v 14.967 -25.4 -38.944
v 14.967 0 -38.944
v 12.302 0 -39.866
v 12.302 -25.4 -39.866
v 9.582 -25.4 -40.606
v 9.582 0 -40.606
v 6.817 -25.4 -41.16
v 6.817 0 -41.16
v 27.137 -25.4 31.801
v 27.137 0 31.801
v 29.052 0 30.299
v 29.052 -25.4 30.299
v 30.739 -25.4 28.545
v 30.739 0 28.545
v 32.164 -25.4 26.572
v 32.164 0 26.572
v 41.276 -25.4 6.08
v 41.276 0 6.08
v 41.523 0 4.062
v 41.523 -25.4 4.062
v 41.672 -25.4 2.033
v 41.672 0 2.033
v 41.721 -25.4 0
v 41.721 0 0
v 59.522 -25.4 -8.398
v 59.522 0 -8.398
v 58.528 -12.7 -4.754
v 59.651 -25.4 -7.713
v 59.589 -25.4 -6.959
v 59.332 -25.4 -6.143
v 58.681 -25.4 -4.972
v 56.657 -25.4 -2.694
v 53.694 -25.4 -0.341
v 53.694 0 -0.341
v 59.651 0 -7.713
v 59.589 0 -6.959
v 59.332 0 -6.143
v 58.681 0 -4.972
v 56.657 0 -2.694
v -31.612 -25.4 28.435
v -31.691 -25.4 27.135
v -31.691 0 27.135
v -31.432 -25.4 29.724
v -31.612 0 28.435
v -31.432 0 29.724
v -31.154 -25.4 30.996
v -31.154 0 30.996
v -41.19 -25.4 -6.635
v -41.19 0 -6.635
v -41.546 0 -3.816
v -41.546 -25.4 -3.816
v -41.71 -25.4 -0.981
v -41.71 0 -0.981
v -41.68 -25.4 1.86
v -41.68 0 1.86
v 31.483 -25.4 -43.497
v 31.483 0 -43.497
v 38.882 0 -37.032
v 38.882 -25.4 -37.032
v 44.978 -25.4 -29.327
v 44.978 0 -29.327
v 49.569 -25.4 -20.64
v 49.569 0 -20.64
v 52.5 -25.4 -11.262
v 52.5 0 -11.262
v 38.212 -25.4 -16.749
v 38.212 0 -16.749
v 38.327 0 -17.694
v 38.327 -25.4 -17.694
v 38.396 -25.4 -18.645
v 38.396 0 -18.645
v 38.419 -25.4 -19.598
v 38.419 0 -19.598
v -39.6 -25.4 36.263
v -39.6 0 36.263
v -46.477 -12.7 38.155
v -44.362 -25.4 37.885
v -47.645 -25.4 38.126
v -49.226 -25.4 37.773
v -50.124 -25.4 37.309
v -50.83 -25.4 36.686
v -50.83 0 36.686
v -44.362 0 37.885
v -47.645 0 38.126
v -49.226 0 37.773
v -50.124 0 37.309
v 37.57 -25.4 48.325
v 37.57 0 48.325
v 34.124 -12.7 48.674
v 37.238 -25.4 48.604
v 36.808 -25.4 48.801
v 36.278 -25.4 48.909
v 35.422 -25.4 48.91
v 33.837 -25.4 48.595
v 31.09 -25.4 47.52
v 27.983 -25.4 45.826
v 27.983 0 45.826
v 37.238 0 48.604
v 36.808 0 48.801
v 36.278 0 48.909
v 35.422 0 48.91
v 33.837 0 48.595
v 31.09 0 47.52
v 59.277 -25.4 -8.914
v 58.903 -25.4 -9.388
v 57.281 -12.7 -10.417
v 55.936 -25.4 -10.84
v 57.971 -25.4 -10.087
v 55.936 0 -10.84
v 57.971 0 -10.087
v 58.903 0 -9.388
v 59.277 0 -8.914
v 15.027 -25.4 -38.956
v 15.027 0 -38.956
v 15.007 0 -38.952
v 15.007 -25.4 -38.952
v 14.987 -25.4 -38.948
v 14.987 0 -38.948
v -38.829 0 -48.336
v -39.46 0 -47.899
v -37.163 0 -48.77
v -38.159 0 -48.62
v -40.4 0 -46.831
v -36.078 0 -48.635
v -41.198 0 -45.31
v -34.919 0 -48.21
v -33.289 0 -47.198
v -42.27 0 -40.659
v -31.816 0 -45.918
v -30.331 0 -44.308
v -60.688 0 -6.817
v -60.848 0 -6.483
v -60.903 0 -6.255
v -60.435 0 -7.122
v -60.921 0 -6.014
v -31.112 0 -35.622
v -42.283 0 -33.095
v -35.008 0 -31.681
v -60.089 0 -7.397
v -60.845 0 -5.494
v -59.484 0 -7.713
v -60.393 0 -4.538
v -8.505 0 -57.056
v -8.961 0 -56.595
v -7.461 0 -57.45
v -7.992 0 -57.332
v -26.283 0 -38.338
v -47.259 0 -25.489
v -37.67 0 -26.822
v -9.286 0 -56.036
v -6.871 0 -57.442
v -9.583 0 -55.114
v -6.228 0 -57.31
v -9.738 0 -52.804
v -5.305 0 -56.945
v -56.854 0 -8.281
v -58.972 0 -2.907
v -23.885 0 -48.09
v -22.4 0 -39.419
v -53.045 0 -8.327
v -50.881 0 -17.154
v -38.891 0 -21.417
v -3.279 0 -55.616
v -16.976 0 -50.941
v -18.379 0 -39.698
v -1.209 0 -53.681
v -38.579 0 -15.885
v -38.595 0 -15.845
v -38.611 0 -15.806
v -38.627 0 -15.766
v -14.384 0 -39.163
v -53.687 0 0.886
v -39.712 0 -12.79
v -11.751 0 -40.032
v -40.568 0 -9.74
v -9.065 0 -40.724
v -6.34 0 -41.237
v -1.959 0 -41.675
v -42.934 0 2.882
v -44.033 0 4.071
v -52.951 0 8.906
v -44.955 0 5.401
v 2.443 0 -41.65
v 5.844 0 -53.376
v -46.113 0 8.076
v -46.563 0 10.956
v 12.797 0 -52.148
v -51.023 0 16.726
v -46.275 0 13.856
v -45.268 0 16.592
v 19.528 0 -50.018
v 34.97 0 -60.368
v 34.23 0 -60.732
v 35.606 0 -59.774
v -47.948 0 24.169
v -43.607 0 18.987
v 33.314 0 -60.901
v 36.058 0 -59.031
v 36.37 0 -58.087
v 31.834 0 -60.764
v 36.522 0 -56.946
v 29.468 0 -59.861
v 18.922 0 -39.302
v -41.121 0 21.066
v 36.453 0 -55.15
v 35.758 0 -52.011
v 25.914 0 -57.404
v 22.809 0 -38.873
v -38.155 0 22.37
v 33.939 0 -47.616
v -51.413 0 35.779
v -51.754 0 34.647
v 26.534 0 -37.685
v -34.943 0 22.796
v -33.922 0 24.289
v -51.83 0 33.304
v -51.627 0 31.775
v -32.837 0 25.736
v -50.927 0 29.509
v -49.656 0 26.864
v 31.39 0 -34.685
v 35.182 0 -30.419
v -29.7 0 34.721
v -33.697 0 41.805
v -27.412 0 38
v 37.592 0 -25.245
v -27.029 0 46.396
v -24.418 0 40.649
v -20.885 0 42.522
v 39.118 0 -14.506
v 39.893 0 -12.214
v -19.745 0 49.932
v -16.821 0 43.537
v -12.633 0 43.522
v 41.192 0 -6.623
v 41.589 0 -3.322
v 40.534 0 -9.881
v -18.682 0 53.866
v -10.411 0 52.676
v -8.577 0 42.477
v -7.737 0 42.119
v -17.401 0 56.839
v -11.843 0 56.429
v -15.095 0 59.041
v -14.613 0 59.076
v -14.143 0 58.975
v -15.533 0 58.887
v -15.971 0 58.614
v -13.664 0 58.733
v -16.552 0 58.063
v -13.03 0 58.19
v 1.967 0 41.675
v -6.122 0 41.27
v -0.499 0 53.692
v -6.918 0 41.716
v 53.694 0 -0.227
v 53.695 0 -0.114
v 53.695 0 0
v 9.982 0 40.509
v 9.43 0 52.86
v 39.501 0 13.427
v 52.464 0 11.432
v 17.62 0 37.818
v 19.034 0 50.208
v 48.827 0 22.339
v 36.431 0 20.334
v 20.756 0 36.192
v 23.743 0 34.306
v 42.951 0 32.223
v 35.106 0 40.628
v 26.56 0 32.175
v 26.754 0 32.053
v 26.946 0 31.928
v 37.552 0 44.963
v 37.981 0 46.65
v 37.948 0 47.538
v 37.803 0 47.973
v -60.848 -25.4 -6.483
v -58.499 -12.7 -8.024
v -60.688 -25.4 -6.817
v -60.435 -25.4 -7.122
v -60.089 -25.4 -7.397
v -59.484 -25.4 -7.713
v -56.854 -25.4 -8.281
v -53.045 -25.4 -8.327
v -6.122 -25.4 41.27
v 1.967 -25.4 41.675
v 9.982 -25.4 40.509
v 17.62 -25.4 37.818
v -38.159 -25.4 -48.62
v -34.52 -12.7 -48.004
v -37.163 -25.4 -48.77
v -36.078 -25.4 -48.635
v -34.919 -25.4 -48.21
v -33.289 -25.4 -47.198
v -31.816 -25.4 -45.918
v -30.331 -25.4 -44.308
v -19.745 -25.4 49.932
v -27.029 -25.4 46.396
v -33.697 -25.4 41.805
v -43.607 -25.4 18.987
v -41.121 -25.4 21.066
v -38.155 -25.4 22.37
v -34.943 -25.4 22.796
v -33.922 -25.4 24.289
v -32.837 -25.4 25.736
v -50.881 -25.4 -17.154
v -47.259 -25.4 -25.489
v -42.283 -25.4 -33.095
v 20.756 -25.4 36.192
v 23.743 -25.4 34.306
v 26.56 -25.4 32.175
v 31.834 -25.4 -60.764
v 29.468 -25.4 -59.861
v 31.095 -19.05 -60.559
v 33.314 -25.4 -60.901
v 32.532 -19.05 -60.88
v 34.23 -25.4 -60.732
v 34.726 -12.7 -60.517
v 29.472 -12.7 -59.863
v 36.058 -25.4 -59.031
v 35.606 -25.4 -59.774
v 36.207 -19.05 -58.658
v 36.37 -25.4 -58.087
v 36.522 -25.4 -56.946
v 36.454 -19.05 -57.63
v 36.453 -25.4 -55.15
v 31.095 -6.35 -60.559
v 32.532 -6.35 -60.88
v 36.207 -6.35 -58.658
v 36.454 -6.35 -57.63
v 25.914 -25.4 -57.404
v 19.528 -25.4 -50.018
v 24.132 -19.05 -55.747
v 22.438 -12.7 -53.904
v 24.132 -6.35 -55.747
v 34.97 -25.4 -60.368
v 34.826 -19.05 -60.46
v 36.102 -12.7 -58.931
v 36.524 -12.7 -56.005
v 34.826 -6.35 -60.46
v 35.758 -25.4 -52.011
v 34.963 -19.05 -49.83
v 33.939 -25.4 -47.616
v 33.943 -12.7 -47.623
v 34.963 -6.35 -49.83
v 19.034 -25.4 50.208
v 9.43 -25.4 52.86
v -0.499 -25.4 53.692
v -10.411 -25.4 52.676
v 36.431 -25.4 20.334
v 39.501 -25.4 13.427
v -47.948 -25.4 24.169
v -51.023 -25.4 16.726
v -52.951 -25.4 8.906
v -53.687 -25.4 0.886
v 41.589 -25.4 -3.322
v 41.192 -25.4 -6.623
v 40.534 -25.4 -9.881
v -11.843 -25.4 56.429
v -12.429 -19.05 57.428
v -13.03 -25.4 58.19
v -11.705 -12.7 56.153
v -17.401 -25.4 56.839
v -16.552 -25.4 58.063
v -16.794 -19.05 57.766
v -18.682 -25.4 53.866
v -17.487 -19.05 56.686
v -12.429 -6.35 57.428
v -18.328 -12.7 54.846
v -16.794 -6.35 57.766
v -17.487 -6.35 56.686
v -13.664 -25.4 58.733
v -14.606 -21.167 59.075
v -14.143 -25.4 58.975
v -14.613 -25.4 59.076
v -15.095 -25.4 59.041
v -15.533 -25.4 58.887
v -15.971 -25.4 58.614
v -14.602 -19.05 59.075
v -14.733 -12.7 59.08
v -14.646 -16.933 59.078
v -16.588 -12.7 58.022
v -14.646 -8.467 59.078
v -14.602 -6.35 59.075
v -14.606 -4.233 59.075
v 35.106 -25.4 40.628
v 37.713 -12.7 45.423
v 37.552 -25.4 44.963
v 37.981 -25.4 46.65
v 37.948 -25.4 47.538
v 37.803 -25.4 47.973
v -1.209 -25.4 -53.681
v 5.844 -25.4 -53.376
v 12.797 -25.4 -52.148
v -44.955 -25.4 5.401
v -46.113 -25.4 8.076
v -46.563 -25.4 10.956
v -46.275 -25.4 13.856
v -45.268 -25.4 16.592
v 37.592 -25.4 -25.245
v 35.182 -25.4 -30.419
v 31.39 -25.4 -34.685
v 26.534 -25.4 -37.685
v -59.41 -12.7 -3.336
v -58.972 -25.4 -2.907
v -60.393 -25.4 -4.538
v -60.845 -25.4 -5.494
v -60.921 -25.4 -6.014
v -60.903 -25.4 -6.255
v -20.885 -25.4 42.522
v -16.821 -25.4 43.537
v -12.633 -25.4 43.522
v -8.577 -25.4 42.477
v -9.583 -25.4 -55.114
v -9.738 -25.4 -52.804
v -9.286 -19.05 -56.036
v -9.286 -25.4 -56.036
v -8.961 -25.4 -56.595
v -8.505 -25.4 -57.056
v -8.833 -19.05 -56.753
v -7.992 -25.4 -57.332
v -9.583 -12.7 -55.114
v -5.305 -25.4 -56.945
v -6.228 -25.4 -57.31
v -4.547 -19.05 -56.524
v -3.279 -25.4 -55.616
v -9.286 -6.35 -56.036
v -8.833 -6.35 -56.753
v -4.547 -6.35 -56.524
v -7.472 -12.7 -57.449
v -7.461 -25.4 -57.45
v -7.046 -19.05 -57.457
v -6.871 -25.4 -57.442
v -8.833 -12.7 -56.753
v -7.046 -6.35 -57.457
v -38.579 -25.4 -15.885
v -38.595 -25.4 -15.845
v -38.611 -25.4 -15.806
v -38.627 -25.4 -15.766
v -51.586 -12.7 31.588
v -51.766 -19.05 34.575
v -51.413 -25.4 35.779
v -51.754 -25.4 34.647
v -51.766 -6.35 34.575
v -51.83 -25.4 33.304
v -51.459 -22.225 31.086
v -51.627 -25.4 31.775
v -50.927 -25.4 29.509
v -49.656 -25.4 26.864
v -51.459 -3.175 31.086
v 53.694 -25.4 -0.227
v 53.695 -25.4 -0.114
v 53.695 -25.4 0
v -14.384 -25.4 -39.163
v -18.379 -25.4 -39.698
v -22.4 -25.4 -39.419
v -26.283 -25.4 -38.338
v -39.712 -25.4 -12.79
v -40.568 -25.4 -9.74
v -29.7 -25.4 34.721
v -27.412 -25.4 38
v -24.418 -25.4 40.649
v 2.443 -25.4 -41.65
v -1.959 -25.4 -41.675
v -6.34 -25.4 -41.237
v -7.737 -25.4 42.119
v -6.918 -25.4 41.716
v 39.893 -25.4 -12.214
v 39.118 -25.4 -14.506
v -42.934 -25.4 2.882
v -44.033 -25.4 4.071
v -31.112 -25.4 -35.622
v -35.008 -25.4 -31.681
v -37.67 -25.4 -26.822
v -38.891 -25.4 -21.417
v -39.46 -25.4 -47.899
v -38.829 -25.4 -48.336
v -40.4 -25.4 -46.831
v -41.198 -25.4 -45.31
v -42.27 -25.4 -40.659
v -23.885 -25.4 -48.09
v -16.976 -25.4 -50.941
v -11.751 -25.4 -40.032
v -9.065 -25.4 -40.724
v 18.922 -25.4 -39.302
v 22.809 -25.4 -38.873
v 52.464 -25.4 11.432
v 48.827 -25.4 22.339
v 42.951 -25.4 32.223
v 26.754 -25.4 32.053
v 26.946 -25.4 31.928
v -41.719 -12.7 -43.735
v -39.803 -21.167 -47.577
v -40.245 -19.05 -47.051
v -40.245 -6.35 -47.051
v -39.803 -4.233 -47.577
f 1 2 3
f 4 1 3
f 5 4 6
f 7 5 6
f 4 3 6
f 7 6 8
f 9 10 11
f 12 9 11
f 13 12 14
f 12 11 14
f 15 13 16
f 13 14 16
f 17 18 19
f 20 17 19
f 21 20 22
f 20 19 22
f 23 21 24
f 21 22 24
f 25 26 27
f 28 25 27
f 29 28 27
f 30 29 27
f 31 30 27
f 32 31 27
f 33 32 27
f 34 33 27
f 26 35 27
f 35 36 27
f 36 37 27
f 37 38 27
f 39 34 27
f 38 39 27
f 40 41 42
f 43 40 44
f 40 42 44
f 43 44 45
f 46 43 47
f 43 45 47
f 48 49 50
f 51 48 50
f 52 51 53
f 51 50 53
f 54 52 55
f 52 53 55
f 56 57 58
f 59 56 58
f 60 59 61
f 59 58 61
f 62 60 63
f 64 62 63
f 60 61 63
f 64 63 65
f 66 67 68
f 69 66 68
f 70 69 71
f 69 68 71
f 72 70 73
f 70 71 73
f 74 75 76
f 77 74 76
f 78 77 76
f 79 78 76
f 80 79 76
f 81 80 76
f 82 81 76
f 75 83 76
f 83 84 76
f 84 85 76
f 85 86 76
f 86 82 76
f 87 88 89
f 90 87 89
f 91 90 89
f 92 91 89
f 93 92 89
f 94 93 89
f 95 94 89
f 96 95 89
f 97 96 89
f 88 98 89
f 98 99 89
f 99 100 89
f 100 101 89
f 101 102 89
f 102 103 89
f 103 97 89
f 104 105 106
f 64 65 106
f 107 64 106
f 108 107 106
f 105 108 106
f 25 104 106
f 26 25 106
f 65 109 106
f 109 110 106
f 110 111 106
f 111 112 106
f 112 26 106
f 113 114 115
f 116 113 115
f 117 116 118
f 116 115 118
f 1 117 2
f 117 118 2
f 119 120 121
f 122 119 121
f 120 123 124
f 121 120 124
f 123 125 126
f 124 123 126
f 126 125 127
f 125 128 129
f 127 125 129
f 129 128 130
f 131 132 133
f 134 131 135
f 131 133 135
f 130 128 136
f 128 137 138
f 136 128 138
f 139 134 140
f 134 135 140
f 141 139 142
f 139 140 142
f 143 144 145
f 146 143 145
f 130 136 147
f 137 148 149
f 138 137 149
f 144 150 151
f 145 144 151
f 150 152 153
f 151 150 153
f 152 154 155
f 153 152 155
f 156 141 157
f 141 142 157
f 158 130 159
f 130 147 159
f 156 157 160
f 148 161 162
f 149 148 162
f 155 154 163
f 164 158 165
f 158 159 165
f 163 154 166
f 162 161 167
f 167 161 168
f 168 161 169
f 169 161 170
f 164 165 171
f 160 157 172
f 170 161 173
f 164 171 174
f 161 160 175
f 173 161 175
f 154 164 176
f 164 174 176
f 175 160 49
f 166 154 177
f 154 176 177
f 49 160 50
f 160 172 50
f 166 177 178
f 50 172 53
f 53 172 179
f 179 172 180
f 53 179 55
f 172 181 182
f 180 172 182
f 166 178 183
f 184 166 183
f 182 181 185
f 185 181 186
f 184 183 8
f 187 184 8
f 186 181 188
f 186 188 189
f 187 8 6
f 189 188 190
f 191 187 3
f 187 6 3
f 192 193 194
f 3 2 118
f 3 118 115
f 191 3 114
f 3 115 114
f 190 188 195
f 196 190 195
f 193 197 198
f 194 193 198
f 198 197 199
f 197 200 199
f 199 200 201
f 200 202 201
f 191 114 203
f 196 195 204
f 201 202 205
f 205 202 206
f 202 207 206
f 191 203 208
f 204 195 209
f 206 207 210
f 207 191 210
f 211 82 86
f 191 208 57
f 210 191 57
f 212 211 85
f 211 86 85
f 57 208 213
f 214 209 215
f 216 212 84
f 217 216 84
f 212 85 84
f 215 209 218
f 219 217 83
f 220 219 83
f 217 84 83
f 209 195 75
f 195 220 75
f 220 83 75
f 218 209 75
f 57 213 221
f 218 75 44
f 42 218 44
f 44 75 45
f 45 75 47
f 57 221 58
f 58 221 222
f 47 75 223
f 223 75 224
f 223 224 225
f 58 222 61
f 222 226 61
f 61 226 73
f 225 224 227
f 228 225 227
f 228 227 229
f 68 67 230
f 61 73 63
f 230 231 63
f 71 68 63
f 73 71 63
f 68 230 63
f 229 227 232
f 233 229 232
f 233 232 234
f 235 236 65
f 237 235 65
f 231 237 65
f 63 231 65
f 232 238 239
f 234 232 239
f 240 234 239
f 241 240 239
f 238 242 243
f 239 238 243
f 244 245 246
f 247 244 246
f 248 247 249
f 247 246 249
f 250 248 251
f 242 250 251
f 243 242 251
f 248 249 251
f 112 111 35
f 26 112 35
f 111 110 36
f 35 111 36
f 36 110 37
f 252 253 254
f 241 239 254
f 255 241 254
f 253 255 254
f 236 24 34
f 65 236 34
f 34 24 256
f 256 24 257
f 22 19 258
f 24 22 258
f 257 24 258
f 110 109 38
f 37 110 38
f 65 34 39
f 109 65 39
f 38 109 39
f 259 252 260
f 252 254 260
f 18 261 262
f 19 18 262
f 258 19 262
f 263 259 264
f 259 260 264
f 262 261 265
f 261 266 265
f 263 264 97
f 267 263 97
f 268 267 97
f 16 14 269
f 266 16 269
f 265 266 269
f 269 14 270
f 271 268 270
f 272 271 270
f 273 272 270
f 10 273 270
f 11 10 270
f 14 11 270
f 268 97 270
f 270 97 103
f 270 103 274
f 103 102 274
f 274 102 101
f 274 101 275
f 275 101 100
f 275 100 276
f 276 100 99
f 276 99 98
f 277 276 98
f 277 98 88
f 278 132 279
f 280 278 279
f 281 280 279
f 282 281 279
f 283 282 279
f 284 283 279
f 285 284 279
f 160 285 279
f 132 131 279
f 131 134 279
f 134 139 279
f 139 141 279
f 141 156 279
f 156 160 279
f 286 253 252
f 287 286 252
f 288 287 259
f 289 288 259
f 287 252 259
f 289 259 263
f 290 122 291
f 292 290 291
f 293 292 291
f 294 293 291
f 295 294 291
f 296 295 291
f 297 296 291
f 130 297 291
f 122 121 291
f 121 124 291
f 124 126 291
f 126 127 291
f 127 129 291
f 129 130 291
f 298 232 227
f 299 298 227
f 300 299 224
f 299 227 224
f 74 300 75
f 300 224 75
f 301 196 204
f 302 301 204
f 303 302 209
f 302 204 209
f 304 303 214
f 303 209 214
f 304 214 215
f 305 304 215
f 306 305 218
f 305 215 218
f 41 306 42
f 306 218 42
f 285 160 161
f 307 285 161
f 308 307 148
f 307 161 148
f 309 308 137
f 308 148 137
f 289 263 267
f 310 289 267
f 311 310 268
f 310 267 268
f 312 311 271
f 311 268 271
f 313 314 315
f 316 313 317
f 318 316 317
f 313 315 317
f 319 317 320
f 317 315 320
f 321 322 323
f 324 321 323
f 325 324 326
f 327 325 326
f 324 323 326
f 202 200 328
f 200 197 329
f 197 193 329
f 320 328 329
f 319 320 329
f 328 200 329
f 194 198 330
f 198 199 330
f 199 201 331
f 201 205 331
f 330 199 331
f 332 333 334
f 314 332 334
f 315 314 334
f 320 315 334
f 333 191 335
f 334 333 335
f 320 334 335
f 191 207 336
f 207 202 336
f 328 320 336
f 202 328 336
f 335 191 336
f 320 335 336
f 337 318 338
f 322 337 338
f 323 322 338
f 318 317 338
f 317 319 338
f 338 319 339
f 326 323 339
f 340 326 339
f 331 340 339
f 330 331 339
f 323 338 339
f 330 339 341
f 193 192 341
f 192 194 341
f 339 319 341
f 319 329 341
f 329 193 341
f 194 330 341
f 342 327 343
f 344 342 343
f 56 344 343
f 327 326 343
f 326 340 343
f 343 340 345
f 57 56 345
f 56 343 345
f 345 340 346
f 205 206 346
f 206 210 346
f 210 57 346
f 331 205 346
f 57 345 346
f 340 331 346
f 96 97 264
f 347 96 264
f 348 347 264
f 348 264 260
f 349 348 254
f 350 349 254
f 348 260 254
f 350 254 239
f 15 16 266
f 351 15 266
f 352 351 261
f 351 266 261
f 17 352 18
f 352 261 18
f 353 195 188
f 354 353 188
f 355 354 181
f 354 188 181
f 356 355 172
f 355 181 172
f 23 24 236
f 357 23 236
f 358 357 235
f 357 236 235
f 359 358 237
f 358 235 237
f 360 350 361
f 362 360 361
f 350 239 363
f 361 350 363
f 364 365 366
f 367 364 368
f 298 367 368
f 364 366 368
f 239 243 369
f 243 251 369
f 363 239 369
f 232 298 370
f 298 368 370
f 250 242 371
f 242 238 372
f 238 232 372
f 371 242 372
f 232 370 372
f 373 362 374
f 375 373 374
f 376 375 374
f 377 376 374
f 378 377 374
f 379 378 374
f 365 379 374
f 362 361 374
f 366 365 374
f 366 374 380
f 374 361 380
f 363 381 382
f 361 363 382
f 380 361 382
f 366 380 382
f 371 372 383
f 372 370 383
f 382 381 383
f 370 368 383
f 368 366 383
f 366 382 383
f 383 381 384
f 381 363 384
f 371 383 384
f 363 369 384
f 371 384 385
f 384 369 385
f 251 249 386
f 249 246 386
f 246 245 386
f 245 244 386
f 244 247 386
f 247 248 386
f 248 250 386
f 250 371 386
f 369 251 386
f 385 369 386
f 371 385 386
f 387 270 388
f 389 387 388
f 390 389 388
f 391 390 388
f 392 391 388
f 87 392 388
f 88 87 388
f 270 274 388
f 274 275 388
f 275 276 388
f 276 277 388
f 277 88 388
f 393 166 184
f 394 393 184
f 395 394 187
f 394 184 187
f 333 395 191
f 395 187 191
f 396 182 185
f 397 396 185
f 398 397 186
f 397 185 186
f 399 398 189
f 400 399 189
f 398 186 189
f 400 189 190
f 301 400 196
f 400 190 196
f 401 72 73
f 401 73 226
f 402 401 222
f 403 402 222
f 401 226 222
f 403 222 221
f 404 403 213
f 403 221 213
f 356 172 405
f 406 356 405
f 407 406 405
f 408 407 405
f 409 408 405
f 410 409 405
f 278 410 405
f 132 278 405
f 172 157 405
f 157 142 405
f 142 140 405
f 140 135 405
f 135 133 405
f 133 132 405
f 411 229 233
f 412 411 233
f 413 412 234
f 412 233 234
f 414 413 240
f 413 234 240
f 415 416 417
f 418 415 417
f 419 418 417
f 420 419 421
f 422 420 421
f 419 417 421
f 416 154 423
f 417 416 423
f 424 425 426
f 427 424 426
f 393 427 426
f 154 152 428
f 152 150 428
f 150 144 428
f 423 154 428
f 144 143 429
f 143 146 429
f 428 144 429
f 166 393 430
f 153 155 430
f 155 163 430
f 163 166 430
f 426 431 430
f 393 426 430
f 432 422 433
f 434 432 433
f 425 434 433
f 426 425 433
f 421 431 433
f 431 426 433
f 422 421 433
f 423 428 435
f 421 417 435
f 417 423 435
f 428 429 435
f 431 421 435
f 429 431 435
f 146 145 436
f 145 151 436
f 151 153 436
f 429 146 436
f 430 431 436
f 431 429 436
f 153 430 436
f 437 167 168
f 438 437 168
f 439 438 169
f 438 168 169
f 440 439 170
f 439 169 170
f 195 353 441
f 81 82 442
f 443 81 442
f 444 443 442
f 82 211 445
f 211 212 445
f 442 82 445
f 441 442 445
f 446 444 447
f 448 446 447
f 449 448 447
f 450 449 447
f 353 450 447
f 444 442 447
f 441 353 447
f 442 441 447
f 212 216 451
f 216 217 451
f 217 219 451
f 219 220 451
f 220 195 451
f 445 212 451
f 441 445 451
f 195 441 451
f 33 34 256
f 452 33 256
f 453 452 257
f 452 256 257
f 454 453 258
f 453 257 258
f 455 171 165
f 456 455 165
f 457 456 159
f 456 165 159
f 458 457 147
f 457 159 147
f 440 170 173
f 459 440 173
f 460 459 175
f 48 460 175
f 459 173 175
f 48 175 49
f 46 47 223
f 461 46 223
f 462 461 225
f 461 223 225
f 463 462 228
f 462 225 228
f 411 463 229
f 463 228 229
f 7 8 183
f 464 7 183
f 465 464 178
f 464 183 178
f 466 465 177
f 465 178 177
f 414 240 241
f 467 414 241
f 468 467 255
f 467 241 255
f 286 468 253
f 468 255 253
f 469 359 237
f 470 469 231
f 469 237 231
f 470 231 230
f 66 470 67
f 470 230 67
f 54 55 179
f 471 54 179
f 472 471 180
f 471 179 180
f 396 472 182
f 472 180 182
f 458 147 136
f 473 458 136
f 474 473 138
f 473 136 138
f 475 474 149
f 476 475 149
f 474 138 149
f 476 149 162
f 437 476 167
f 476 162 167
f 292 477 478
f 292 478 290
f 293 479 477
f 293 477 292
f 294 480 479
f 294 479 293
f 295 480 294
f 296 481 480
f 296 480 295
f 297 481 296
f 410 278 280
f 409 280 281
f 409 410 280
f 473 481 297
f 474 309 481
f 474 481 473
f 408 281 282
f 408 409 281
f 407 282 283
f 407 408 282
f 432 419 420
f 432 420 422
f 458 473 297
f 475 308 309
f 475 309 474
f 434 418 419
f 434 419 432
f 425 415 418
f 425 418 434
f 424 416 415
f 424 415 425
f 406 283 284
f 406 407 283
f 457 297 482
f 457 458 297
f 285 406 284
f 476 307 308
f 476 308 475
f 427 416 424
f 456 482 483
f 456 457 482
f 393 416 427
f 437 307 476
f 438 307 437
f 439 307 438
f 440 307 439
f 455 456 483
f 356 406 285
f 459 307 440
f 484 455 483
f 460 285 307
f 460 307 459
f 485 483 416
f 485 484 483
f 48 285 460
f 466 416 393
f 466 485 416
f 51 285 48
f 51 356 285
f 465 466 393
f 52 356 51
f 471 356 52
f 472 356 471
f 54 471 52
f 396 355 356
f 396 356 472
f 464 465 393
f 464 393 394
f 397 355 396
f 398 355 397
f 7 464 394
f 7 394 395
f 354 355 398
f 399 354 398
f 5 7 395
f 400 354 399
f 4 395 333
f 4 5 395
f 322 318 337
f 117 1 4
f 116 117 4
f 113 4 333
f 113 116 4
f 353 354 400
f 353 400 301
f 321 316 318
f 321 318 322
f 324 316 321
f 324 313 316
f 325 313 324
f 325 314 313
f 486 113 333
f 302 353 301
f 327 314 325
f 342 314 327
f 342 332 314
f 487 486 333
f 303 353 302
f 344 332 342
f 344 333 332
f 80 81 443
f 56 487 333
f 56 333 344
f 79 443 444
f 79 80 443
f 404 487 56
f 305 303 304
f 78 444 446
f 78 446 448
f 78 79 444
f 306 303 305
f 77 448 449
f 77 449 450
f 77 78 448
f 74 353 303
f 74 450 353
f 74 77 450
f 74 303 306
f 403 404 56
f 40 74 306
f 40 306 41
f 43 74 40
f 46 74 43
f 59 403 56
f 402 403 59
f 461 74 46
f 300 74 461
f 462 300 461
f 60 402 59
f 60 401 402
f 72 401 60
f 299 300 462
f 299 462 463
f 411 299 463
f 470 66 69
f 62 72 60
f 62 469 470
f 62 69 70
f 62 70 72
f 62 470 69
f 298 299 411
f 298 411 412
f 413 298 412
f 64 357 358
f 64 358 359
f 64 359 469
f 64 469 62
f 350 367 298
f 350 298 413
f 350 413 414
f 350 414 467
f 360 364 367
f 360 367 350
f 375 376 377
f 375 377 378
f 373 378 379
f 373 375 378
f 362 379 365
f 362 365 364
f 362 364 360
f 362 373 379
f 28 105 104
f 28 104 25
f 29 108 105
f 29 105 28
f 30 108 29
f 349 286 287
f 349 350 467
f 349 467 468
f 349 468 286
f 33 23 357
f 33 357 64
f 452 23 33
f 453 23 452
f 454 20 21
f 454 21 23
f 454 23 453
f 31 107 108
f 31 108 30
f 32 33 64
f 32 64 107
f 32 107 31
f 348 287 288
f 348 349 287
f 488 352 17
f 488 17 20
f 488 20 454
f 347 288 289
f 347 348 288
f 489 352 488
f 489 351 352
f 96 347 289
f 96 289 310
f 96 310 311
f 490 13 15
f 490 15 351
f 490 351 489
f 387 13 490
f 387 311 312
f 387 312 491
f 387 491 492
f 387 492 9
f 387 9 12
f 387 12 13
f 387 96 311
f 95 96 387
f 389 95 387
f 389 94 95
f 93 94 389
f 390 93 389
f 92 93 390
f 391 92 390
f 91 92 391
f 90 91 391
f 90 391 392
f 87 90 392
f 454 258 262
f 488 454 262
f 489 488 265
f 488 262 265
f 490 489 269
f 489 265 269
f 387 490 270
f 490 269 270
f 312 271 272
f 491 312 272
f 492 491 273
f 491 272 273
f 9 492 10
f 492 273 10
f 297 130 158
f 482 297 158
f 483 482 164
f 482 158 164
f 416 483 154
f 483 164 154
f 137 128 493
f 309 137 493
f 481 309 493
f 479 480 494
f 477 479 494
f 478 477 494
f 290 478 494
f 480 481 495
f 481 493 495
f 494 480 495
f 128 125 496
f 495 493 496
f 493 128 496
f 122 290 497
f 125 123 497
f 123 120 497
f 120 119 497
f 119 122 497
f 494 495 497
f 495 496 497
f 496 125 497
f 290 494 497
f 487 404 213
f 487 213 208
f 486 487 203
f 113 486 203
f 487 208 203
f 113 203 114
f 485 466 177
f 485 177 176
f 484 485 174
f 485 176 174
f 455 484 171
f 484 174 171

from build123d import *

# Parameters (mm, degrees)
F1_DEPTH = 25.4


with BuildPart() as f1:
    # F0 (on Front) → F1 (new body)
    with BuildSketch(Plane.XZ):
        with BuildLine():
            add(Edge.make_bspline(
                [(53.693628733, -0.3408626991), (48.6992844614, 3.1439014528), (41.2756389905, 6.0803446271)],
                knots=[0.8096035838, 0.8096035838, 0.8096035838, 1.4091490359, 1.4091490359, 1.4091490359], degree=2, weights=[1, 0.9554036285, 1]))
            ThreePointArc((41.2756389905, 6.0803446271), (41.609574758, 3.048319753), (41.7210853749, 0))
            ThreePointArc((41.7210853749, 0), (41.423267093, -4.9761338609), (40.5340640891, -9.8812252922))
            add(Edge.make_bspline(
                [(40.5340640891, -9.8812252922), (47.4861511231, -11.4434594754), (52.5004244601, -11.2617665317)],
                knots=[5.0489926173, 5.0489926173, 5.0489926173, 5.6083337617, 5.6083337617, 5.6083337617], degree=2, weights=[1, 0.9611464254, 1]))
            ThreePointArc((52.5004244601, -11.2617665317), (53.3770621946, -5.831910954), (53.693628733, -0.3408626991))
        make_face()
        with BuildLine():
            ThreePointArc((32.1644406561, 26.5724993581), (38.1227415856, 16.9500896415), (41.2756389905, 6.0803446271))
            add(Edge.make_bspline(
                [(53.693628733, -0.3408626991), (48.6992844614, 3.1439014528), (41.2756389905, 6.0803446271)],
                knots=[0.8096035838, 0.8096035838, 0.8096035838, 1.4091490359, 1.4091490359, 1.4091490359], degree=2, weights=[1, 0.9554036285, 1]))
            ThreePointArc((53.693628733, -0.3408626991), (53.6944401848, -0.1704322081), (53.6947106697, 0))
            ThreePointArc((53.6947106697, 0), (48.826996956, 22.339344712), (35.1064245633, 40.6283264273))
            add(Edge.make_bspline(
                [(27.1371365833, 31.8005567559), (32.084402839, 36.3468628195), (35.1064245633, 40.6283264273)],
                knots=[4.7728408838, 4.7728408838, 4.7728408838, 5.4225636803, 5.4225636803, 5.4225636803], degree=2, weights=[1, 0.9476949741, 1]))
            ThreePointArc((27.1371365833, 31.8005567559), (29.9261613459, 29.4513266854), (32.1644406561, 26.5724993581))
        make_face()
        with BuildLine():
            ThreePointArc((-6.3396664298, -41.2366050302), (-10.413682261, -40.4005468604), (-14.3842187106, -39.1630338067))
            ThreePointArc((-14.3842187106, -39.1630338067), (-20.3966008315, -39.6606382593), (-26.2826891334, -38.3376441323))
            add(Edge.make_bspline(
                [(-30.3308582118, -44.3075726489), (-28.2730966274, -41.8596665456), (-26.2826891334, -38.3376441323)],
                knots=[0.6723492071, 0.6723492071, 0.6723492071, 0.9906714204, 0.9906714204, 0.9906714204], degree=2, weights=[1, 0.987360587, 1]))
            ThreePointArc((-30.3308582118, -44.3075726489), (-20.4796933723, -49.6357140905), (-9.7375287913, -52.8043794296))
            add(Edge.make_bspline(
                [(-6.3396664298, -41.2366050302), (-9.5239160693, -47.9996812879), (-9.7375287913, -52.8043794296)],
                knots=[1.7166702175, 1.7166702175, 1.7166702175, 2.5286176677, 2.5286176677, 2.5286176677], degree=2, weights=[1, 0.9187182955, 1]))
        make_face()
        with BuildLine():
            ThreePointArc((40.5340640891, -9.8812252922), (39.5223349898, -13.3654031667), (38.2117310963, -16.7485095302))
            ThreePointArc((38.2117310963, -16.7485095302), (38.3669461003, -18.1692839125), (38.4187753132, -19.5975714451))
            ThreePointArc((38.4187753132, -19.5975714451), (35.1817365731, -30.4188312542), (26.5340961431, -37.6849442905))
            add(Edge.make_bspline(
                [(31.4827147543, -43.4966737303), (29.210163647, -40.1868893619), (26.5340961431, -37.6849442905)],
                knots=[4.6928177183, 4.6928177183, 4.6928177183, 5.1804165566, 5.1804165566, 5.1804165566], degree=2, weights=[1, 0.9704278342, 1]))
            ThreePointArc((31.4827147543, -43.4966737303), (44.9784862862, -29.3267407889), (52.5004244601, -11.2617665317))
            add(Edge.make_bspline(
                [(40.5340640891, -9.8812252922), (47.4861511231, -11.4434594754), (52.5004244601, -11.2617665317)],
                knots=[5.0489926173, 5.0489926173, 5.0489926173, 5.6083337617, 5.6083337617, 5.6083337617], degree=2, weights=[1, 0.9611464254, 1]))
        make_face()
        with BuildLine():
            ThreePointArc((17.6204868833, 37.8175542156), (22.2695690482, 35.280522378), (26.5597779081, 32.17494619))
            ThreePointArc((26.5597779081, 32.17494619), (26.8503077889, 31.9906052587), (27.1371365833, 31.8005567559))
            add(Edge.make_bspline(
                [(27.1371365833, 31.8005567559), (32.084402839, 36.3468628195), (35.1064245633, 40.6283264273)],
                knots=[4.7728408838, 4.7728408838, 4.7728408838, 5.4225636803, 5.4225636803, 5.4225636803], degree=2, weights=[1, 0.9476949741, 1]))
            ThreePointArc((35.1064245633, 40.6283264273), (31.6517562305, 43.3738202309), (27.983313431, 45.8263693012))
            add(Edge.make_bspline(
                [(27.983313431, 45.8263693012), (22.8232865987, 42.6915518829), (17.6204868833, 37.8175542156)],
                knots=[0.9783258244, 0.9783258244, 0.9783258244, 1.6663632628, 1.6663632628, 1.6663632628], degree=2, weights=[1, 0.9414068654, 1]))
        make_face()
        with BuildLine():
            ThreePointArc((-6.1218418572, 41.2695046873), (6.0028076659, 41.28698663), (17.6204868833, 37.8175542156))
            add(Edge.make_bspline(
                [(27.983313431, 45.8263693012), (22.8232865987, 42.6915518829), (17.6204868833, 37.8175542156)],
                knots=[0.9783258244, 0.9783258244, 0.9783258244, 1.6663632628, 1.6663632628, 1.6663632628], degree=2, weights=[1, 0.9414068654, 1]))
            ThreePointArc((27.983313431, 45.8263693012), (9.4299236667, 52.8601787127), (-10.4111628746, 52.6757025724))
            add(Edge.make_bspline(
                [(-8.576725661, 42.4772444818), (-9.1854960537, 48.4691725927), (-10.4111628746, 52.6757025724)],
                knots=[5.0993735251, 5.0993735251, 5.0993735251, 5.5754450976, 5.5754450976, 5.5754450976], degree=2, weights=[1, 0.9718029995, 1]))
            ThreePointArc((-8.576725661, 42.4772444818), (-7.3248144541, 41.9231115401), (-6.1218418572, 41.2695046873))
        make_face()
        with BuildLine():
            add(Edge.make_bspline(
                [(59.5222562551, -8.3979219198), (60.6169207592, -5.1715348662), (53.693628733, -0.3408626991)],
                knots=[0, 0, 0, 0.8096035838, 0.8096035838, 0.8096035838], degree=2, weights=[1, 0.9191804768, 1]))
            ThreePointArc((53.693628733, -0.3408626991), (53.3770621946, -5.831910954), (52.5004244601, -11.2617665317))
            add(Edge.make_bspline(
                [(52.5004244601, -11.2617665317), (58.625903827, -11.0398088715), (59.5222562551, -8.3979219198)],
                knots=[5.6083337617, 5.6083337617, 5.6083337617, 6.2831853072, 6.2831853072, 6.2831853072], degree=2, weights=[1, 0.9436100125, 1]))
        make_face()
        with BuildLine():
            ThreePointArc((6.8173111066, -41.1603356902), (0.2418478083, -41.7203844001), (-6.3396664298, -41.2366050302))
            add(Edge.make_bspline(
                [(-6.3396664298, -41.2366050302), (-9.5239160693, -47.9996812879), (-9.7375287913, -52.8043794296)],
                knots=[1.7166702175, 1.7166702175, 1.7166702175, 2.5286176677, 2.5286176677, 2.5286176677], degree=2, weights=[1, 0.9187182955, 1]))
            ThreePointArc((-9.7375287913, -52.8043794296), (-5.4910295589, -53.4132057481), (-1.2094802131, -53.6810870933))
            add(Edge.make_bspline(
                [(-1.2094802131, -53.6810870933), (3.4559192594, -48.7460644434), (6.8173111066, -41.1603356902)],
                knots=[4.0260366054, 4.0260366054, 4.0260366054, 4.9246773136, 4.9246773136, 4.9246773136], degree=2, weights=[1, 0.9007425169, 1]))
        make_face()
        with BuildLine():
            add(Edge.make_bspline(
                [(-30.3308582118, -44.3075726489), (-28.2730966274, -41.8596665456), (-26.2826891334, -38.3376441323)],
                knots=[0.6723492071, 0.6723492071, 0.6723492071, 0.9906714204, 0.9906714204, 0.9906714204], degree=2, weights=[1, 0.987360587, 1]))
            ThreePointArc((-26.2826891334, -38.3376441323), (-36.508657562, -29.3443912437), (-38.5788214038, -15.884694015))
            ThreePointArc((-38.5788214038, -15.884694015), (-38.6031705619, -15.8254285068), (-38.6274286754, -15.7661256746))
            add(Edge.make_bspline(
                [(-38.6274286754, -15.7661256746), (-41.6047866658, -24.8493489432), (-42.2831363751, -33.094687371)],
                knots=[4.6480564766, 4.6480564766, 4.6480564766, 5.2776412265, 5.2776412265, 5.2776412265], degree=2, weights=[1, 0.9508606841, 1]))
            ThreePointArc((-42.2831363751, -33.094687371), (-36.7373141578, -39.1598225528), (-30.3308582118, -44.3075726489))
        make_face()
        with BuildLine():
            ThreePointArc((-20.8851648358, 42.52215403), (-14.7267133041, 43.6595556974), (-8.576725661, 42.4772444818))
            add(Edge.make_bspline(
                [(-8.576725661, 42.4772444818), (-9.1854960537, 48.4691725927), (-10.4111628746, 52.6757025724)],
                knots=[5.0993735251, 5.0993735251, 5.0993735251, 5.5754450976, 5.5754450976, 5.5754450976], degree=2, weights=[1, 0.9718029995, 1]))
            ThreePointArc((-10.4111628746, 52.6757025724), (-15.1405582049, 51.5158757195), (-19.7454292684, 49.9323540093))
            add(Edge.make_bspline(
                [(-19.7454292684, 49.9323540093), (-20.4681418042, 46.605504239), (-20.8851648358, 42.52215403)],
                knots=[0.8540179343, 0.8540179343, 0.8540179343, 1.1819925491, 1.1819925491, 1.1819925491], degree=2, weights=[1, 0.9865841866, 1]))
        make_face()
        with BuildLine():
            add(Edge.make_bspline(
                [(37.5697463751, 48.3250170946), (35.6501297843, 50.4841104773), (27.983313431, 45.8263693012)],
                knots=[0, 0, 0, 0.9783258244, 0.9783258244, 0.9783258244], degree=2, weights=[1, 0.8827265046, 1]))
            ThreePointArc((27.983313431, 45.8263693012), (31.6517562305, 43.3738202309), (35.1064245633, 40.6283264273))
            add(Edge.make_bspline(
                [(35.1064245633, 40.6283264273), (39.2249720197, 46.4632980654), (37.5697463751, 48.3250170946)],
                knots=[5.4225636803, 5.4225636803, 5.4225636803, 6.2831853072, 6.2831853072, 6.2831853072], degree=2, weights=[1, 0.9088361367, 1]))
        make_face()
        with BuildLine():
            ThreePointArc((15.0271608977, -38.9558268545), (14.9968676707, -38.9500347429), (14.966583546, -38.9441952262))
            ThreePointArc((14.966583546, -38.9441952262), (10.9481658828, -40.2589943821), (6.8173111066, -41.1603356902))
            add(Edge.make_bspline(
                [(-1.2094802131, -53.6810870933), (3.4559192594, -48.7460644434), (6.8173111066, -41.1603356902)],
                knots=[4.0260366054, 4.0260366054, 4.0260366054, 4.9246773136, 4.9246773136, 4.9246773136], degree=2, weights=[1, 0.9007425169, 1]))
            ThreePointArc((-1.2094802131, -53.6810870933), (9.3406679907, -52.8760236344), (19.5281111595, -50.0177451355))
            add(Edge.make_bspline(
                [(15.0271608977, -38.9558268545), (15.5644341459, -43.9544244636), (19.5281111595, -50.0177451355)],
                knots=[0.6519732759, 0.6519732759, 0.6519732759, 1.4972484493, 1.4972484493, 1.4972484493], degree=2, weights=[1, 0.9120102619, 1]))
        make_face()
        with BuildLine():
            ThreePointArc((-1.2094802131, -53.6810870933), (-5.4910295589, -53.4132057481), (-9.7375287913, -52.8043794296))
            add(Edge.make_bspline(
                [(-9.7375287913, -52.8043794296), (-10.1992836129, -63.1904300033), (-1.2094802131, -53.6810870933)],
                knots=[2.5286176677, 2.5286176677, 2.5286176677, 4.0260366054, 4.0260366054, 4.0260366054], degree=2, weights=[1, 0.7325679354, 1]))
        make_face()
        with BuildLine():
            add(Edge.make_bspline(
                [(-38.1590723991, -48.6196428537), (-34.8104654464, -49.6364980081), (-30.3308582118, -44.3075726489)],
                knots=[0, 0, 0, 0.6723492071, 0.6723492071, 0.6723492071], degree=2, weights=[1, 0.9440234848, 1]))
            ThreePointArc((-30.3308582118, -44.3075726489), (-36.7373141578, -39.1598225528), (-42.2831363751, -33.094687371))
            add(Edge.make_bspline(
                [(-42.2831363751, -33.094687371), (-43.428734623, -47.0194302073), (-38.1590723991, -48.6196428537)],
                knots=[5.2776412265, 5.2776412265, 5.2776412265, 6.2831853072, 6.2831853072, 6.2831853072], degree=2, weights=[1, 0.8762502049, 1]))
        make_face()
        with BuildLine():
            add(Edge.make_bspline(
                [(31.4827147543, -43.4966737303), (29.210163647, -40.1868893619), (26.5340961431, -37.6849442905)],
                knots=[4.6928177183, 4.6928177183, 4.6928177183, 5.1804165566, 5.1804165566, 5.1804165566], degree=2, weights=[1, 0.9704278342, 1]))
            ThreePointArc((26.5340961431, -37.6849442905), (20.8760610269, -39.1844588582), (15.0271608977, -38.9558268545))
            add(Edge.make_bspline(
                [(15.0271608977, -38.9558268545), (15.5644341459, -43.9544244636), (19.5281111595, -50.0177451355)],
                knots=[0.6519732759, 0.6519732759, 0.6519732759, 1.4972484493, 1.4972484493, 1.4972484493], degree=2, weights=[1, 0.9120102619, 1]))
            ThreePointArc((19.5281111595, -50.0177451355), (25.712976941, -47.1377213146), (31.4827147543, -43.4966737303))
        make_face()
        with BuildLine():
            add(Edge.make_bspline(
                [(19.5281111595, -50.0177451355), (28.5825003351, -63.8684360144), (34.7255731463, -60.5174745098), (40.8686459575, -57.1665130052), (31.4827147543, -43.4966737303)],
                knots=[1.4972484493, 1.4972484493, 1.4972484493, 3.0950330838, 3.0950330838, 4.6928177183, 4.6928177183, 4.6928177183], degree=2, weights=[1, 0.6975008847, 1, 0.6975008847, 1]))
            ThreePointArc((31.4827147543, -43.4966737303), (25.712976941, -47.1377213146), (19.5281111595, -50.0177451355))
        make_face()
        with BuildLine():
            ThreePointArc((-31.1543963718, 30.9961341287), (-27.4120365411, 37.9995894977), (-20.8851648358, 42.52215403))
            add(Edge.make_bspline(
                [(-19.7454292684, 49.9323540093), (-20.4681418042, 46.605504239), (-20.8851648358, 42.52215403)],
                knots=[0.8540179343, 0.8540179343, 0.8540179343, 1.1819925491, 1.1819925491, 1.1819925491], degree=2, weights=[1, 0.9865841866, 1]))
            ThreePointArc((-19.7454292684, 49.9323540093), (-30.4494435134, 44.2261613033), (-39.5995081415, 36.2629412603))
            add(Edge.make_bspline(
                [(-31.1543963718, 30.9961341287), (-35.4059183226, 34.3519271397), (-39.5995081415, 36.2629412603)],
                knots=[4.8332950545, 4.8332950545, 4.8332950545, 5.3387113323, 5.3387113323, 5.3387113323], degree=2, weights=[1, 0.9682388652, 1]))
        make_face()
        with BuildLine():
            ThreePointArc((-19.7454292684, 49.9323540093), (-15.1405582049, 51.5158757195), (-10.4111628746, 52.6757025724))
            add(Edge.make_bspline(
                [(-10.4111628746, 52.6757025724), (-12.2772780351, 59.080272913), (-14.7332325578, 59.080272913)],
                knots=[5.5754450976, 5.5754450976, 5.5754450976, 6.2831853072, 6.2831853072, 6.2831853072], degree=2, weights=[1, 0.9380386309, 1]))
            add(Edge.make_bspline(
                [(-14.7332325578, 59.080272913), (-17.7581692102, 59.080272913), (-19.7454292684, 49.9323540093)],
                knots=[0, 0, 0, 0.8540179343, 0.8540179343, 0.8540179343], degree=2, weights=[1, 0.9102085562, 1]))
        make_face()
        with BuildLine():
            add(Edge.make_bspline(
                [(-38.6274286754, -15.7661256746), (-41.6047866658, -24.8493489432), (-42.2831363751, -33.094687371)],
                knots=[4.6480564766, 4.6480564766, 4.6480564766, 5.2776412265, 5.2776412265, 5.2776412265], degree=2, weights=[1, 0.9508606841, 1]))
            ThreePointArc((-38.6274286754, -15.7661256746), (-40.1691199824, -11.2734539827), (-41.1901710225, -6.6346647235))
            add(Edge.make_bspline(
                [(-53.0451270773, -8.3268509806), (-48.1613250647, -8.0878187298), (-41.1901710225, -6.6346647235)],
                knots=[0.6133498335, 0.6133498335, 0.6133498335, 1.0433774897, 1.0433774897, 1.0433774897], degree=2, weights=[1, 0.9769734439, 1]))
            ThreePointArc((-53.0451270773, -8.3268509806), (-49.2466332157, -21.3983894446), (-42.2831363751, -33.094687371))
        make_face()
        with BuildLine():
            ThreePointArc((-34.9425613518, 22.7961920292), (-33.3874933876, 25.0184781742), (-31.6913143482, 27.1350245945))
            ThreePointArc((-31.6913143482, 27.1350245945), (-31.5345084219, 29.0811056075), (-31.1543963718, 30.9961341287))
            add(Edge.make_bspline(
                [(-31.1543963718, 30.9961341287), (-35.4059183226, 34.3519271397), (-39.5995081415, 36.2629412603)],
                knots=[4.8332950545, 4.8332950545, 4.8332950545, 5.3387113323, 5.3387113323, 5.3387113323], degree=2, weights=[1, 0.9682388652, 1]))
            ThreePointArc((-39.5995081415, 36.2629412603), (-44.1892584675, 30.5029734614), (-47.9476323812, 24.1691229245))
            add(Edge.make_bspline(
                [(-47.9476323812, 24.1691229245), (-46.0966583923, 21.542122406), (-43.6072420088, 18.9869027955)],
                knots=[1.0393431008, 1.0393431008, 1.0393431008, 1.3793222328, 1.3793222328, 1.3793222328], degree=2, weights=[1, 0.9855865321, 1]))
            ThreePointArc((-43.6072420088, 18.9869027955), (-39.6842488788, 21.8226562192), (-34.9425613518, 22.7961920292))
        make_face()
        with BuildLine():
            ThreePointArc((-41.1901710225, -6.6346647235), (-41.6520026913, -2.3999243035), (-41.6796110485, 1.8598353955))
            ThreePointArc((-41.6796110485, 1.8598353955), (-43.5048627977, 3.4572565278), (-44.9551329371, 5.4014825293))
            add(Edge.make_bspline(
                [(-44.9551329371, 5.4014825293), (-50.0196481139, 3.0827092087), (-53.6874014766, 0.8859326133)],
                knots=[5.2339716844, 5.2339716844, 5.2339716844, 5.5712940382, 5.5712940382, 5.5712940382], degree=2, weights=[1, 0.9858103888, 1]))
            ThreePointArc((-53.6874014766, 0.8859326133), (-53.5646992735, -3.7342931913), (-53.0451270773, -8.3268509806))
            add(Edge.make_bspline(
                [(-53.0451270773, -8.3268509806), (-48.1613250647, -8.0878187298), (-41.1901710225, -6.6346647235)],
                knots=[0.6133498335, 0.6133498335, 0.6133498335, 1.0433774897, 1.0433774897, 1.0433774897], degree=2, weights=[1, 0.9769734439, 1]))
        make_face()
        with BuildLine():
            add(Edge.make_bspline(
                [(-60.8482472599, -6.4826011658), (-60.1266412767, -8.6734478069), (-53.0451270773, -8.3268509806)],
                knots=[0, 0, 0, 0.6133498335, 0.6133498335, 0.6133498335], degree=2, weights=[1, 0.9533426488, 1]))
            ThreePointArc((-53.0451270773, -8.3268509806), (-53.5646992735, -3.7342931913), (-53.6874014766, 0.8859326133))
            add(Edge.make_bspline(
                [(-53.6874014766, 0.8859326133), (-61.6954496919, -3.9104348508), (-60.8482472599, -6.4826011658)],
                knots=[5.5712940382, 5.5712940382, 5.5712940382, 6.2831853072, 6.2831853072, 6.2831853072], degree=2, weights=[1, 0.9373173762, 1]))
        make_face()
        with BuildLine():
            ThreePointArc((-47.9476323812, 24.1691229245), (-44.1892584675, 30.5029734614), (-39.5995081415, 36.2629412603))
            add(Edge.make_bspline(
                [(-39.5995081415, 36.2629412603), (-47.8945435176, 40.042979466), (-50.8296489716, 36.6857647896)],
                knots=[5.3387113323, 5.3387113323, 5.3387113323, 6.2831853072, 6.2831853072, 6.2831853072], degree=2, weights=[1, 0.8905529574, 1]))
            add(Edge.make_bspline(
                [(-50.8296489716, 36.6857647896), (-54.1172457339, 32.9253656237), (-47.9476323812, 24.1691229245)],
                knots=[0, 0, 0, 1.0393431008, 1.0393431008, 1.0393431008], degree=2, weights=[1, 0.867982333, 1]))
        make_face()
        with BuildLine():
            add(Edge.make_bspline(
                [(-44.9551329371, 5.4014825293), (-50.0196481139, 3.0827092087), (-53.6874014766, 0.8859326133)],
                knots=[5.2339716844, 5.2339716844, 5.2339716844, 5.5712940382, 5.5712940382, 5.5712940382], degree=2, weights=[1, 0.9858103888, 1]))
            ThreePointArc((-44.9551329371, 5.4014825293), (-46.5107671058, 12.4154026141), (-43.6072420088, 18.9869027955))
            add(Edge.make_bspline(
                [(-47.9476323812, 24.1691229245), (-46.0966583923, 21.542122406), (-43.6072420088, 18.9869027955)],
                knots=[1.0393431008, 1.0393431008, 1.0393431008, 1.3793222328, 1.3793222328, 1.3793222328], degree=2, weights=[1, 0.9855865321, 1]))
            ThreePointArc((-47.9476323812, 24.1691229245), (-52.1339310295, 12.8520500045), (-53.6874014766, 0.8859326133))
        make_face()
    extrude(amount=F1_DEPTH)


solid = f1.part
